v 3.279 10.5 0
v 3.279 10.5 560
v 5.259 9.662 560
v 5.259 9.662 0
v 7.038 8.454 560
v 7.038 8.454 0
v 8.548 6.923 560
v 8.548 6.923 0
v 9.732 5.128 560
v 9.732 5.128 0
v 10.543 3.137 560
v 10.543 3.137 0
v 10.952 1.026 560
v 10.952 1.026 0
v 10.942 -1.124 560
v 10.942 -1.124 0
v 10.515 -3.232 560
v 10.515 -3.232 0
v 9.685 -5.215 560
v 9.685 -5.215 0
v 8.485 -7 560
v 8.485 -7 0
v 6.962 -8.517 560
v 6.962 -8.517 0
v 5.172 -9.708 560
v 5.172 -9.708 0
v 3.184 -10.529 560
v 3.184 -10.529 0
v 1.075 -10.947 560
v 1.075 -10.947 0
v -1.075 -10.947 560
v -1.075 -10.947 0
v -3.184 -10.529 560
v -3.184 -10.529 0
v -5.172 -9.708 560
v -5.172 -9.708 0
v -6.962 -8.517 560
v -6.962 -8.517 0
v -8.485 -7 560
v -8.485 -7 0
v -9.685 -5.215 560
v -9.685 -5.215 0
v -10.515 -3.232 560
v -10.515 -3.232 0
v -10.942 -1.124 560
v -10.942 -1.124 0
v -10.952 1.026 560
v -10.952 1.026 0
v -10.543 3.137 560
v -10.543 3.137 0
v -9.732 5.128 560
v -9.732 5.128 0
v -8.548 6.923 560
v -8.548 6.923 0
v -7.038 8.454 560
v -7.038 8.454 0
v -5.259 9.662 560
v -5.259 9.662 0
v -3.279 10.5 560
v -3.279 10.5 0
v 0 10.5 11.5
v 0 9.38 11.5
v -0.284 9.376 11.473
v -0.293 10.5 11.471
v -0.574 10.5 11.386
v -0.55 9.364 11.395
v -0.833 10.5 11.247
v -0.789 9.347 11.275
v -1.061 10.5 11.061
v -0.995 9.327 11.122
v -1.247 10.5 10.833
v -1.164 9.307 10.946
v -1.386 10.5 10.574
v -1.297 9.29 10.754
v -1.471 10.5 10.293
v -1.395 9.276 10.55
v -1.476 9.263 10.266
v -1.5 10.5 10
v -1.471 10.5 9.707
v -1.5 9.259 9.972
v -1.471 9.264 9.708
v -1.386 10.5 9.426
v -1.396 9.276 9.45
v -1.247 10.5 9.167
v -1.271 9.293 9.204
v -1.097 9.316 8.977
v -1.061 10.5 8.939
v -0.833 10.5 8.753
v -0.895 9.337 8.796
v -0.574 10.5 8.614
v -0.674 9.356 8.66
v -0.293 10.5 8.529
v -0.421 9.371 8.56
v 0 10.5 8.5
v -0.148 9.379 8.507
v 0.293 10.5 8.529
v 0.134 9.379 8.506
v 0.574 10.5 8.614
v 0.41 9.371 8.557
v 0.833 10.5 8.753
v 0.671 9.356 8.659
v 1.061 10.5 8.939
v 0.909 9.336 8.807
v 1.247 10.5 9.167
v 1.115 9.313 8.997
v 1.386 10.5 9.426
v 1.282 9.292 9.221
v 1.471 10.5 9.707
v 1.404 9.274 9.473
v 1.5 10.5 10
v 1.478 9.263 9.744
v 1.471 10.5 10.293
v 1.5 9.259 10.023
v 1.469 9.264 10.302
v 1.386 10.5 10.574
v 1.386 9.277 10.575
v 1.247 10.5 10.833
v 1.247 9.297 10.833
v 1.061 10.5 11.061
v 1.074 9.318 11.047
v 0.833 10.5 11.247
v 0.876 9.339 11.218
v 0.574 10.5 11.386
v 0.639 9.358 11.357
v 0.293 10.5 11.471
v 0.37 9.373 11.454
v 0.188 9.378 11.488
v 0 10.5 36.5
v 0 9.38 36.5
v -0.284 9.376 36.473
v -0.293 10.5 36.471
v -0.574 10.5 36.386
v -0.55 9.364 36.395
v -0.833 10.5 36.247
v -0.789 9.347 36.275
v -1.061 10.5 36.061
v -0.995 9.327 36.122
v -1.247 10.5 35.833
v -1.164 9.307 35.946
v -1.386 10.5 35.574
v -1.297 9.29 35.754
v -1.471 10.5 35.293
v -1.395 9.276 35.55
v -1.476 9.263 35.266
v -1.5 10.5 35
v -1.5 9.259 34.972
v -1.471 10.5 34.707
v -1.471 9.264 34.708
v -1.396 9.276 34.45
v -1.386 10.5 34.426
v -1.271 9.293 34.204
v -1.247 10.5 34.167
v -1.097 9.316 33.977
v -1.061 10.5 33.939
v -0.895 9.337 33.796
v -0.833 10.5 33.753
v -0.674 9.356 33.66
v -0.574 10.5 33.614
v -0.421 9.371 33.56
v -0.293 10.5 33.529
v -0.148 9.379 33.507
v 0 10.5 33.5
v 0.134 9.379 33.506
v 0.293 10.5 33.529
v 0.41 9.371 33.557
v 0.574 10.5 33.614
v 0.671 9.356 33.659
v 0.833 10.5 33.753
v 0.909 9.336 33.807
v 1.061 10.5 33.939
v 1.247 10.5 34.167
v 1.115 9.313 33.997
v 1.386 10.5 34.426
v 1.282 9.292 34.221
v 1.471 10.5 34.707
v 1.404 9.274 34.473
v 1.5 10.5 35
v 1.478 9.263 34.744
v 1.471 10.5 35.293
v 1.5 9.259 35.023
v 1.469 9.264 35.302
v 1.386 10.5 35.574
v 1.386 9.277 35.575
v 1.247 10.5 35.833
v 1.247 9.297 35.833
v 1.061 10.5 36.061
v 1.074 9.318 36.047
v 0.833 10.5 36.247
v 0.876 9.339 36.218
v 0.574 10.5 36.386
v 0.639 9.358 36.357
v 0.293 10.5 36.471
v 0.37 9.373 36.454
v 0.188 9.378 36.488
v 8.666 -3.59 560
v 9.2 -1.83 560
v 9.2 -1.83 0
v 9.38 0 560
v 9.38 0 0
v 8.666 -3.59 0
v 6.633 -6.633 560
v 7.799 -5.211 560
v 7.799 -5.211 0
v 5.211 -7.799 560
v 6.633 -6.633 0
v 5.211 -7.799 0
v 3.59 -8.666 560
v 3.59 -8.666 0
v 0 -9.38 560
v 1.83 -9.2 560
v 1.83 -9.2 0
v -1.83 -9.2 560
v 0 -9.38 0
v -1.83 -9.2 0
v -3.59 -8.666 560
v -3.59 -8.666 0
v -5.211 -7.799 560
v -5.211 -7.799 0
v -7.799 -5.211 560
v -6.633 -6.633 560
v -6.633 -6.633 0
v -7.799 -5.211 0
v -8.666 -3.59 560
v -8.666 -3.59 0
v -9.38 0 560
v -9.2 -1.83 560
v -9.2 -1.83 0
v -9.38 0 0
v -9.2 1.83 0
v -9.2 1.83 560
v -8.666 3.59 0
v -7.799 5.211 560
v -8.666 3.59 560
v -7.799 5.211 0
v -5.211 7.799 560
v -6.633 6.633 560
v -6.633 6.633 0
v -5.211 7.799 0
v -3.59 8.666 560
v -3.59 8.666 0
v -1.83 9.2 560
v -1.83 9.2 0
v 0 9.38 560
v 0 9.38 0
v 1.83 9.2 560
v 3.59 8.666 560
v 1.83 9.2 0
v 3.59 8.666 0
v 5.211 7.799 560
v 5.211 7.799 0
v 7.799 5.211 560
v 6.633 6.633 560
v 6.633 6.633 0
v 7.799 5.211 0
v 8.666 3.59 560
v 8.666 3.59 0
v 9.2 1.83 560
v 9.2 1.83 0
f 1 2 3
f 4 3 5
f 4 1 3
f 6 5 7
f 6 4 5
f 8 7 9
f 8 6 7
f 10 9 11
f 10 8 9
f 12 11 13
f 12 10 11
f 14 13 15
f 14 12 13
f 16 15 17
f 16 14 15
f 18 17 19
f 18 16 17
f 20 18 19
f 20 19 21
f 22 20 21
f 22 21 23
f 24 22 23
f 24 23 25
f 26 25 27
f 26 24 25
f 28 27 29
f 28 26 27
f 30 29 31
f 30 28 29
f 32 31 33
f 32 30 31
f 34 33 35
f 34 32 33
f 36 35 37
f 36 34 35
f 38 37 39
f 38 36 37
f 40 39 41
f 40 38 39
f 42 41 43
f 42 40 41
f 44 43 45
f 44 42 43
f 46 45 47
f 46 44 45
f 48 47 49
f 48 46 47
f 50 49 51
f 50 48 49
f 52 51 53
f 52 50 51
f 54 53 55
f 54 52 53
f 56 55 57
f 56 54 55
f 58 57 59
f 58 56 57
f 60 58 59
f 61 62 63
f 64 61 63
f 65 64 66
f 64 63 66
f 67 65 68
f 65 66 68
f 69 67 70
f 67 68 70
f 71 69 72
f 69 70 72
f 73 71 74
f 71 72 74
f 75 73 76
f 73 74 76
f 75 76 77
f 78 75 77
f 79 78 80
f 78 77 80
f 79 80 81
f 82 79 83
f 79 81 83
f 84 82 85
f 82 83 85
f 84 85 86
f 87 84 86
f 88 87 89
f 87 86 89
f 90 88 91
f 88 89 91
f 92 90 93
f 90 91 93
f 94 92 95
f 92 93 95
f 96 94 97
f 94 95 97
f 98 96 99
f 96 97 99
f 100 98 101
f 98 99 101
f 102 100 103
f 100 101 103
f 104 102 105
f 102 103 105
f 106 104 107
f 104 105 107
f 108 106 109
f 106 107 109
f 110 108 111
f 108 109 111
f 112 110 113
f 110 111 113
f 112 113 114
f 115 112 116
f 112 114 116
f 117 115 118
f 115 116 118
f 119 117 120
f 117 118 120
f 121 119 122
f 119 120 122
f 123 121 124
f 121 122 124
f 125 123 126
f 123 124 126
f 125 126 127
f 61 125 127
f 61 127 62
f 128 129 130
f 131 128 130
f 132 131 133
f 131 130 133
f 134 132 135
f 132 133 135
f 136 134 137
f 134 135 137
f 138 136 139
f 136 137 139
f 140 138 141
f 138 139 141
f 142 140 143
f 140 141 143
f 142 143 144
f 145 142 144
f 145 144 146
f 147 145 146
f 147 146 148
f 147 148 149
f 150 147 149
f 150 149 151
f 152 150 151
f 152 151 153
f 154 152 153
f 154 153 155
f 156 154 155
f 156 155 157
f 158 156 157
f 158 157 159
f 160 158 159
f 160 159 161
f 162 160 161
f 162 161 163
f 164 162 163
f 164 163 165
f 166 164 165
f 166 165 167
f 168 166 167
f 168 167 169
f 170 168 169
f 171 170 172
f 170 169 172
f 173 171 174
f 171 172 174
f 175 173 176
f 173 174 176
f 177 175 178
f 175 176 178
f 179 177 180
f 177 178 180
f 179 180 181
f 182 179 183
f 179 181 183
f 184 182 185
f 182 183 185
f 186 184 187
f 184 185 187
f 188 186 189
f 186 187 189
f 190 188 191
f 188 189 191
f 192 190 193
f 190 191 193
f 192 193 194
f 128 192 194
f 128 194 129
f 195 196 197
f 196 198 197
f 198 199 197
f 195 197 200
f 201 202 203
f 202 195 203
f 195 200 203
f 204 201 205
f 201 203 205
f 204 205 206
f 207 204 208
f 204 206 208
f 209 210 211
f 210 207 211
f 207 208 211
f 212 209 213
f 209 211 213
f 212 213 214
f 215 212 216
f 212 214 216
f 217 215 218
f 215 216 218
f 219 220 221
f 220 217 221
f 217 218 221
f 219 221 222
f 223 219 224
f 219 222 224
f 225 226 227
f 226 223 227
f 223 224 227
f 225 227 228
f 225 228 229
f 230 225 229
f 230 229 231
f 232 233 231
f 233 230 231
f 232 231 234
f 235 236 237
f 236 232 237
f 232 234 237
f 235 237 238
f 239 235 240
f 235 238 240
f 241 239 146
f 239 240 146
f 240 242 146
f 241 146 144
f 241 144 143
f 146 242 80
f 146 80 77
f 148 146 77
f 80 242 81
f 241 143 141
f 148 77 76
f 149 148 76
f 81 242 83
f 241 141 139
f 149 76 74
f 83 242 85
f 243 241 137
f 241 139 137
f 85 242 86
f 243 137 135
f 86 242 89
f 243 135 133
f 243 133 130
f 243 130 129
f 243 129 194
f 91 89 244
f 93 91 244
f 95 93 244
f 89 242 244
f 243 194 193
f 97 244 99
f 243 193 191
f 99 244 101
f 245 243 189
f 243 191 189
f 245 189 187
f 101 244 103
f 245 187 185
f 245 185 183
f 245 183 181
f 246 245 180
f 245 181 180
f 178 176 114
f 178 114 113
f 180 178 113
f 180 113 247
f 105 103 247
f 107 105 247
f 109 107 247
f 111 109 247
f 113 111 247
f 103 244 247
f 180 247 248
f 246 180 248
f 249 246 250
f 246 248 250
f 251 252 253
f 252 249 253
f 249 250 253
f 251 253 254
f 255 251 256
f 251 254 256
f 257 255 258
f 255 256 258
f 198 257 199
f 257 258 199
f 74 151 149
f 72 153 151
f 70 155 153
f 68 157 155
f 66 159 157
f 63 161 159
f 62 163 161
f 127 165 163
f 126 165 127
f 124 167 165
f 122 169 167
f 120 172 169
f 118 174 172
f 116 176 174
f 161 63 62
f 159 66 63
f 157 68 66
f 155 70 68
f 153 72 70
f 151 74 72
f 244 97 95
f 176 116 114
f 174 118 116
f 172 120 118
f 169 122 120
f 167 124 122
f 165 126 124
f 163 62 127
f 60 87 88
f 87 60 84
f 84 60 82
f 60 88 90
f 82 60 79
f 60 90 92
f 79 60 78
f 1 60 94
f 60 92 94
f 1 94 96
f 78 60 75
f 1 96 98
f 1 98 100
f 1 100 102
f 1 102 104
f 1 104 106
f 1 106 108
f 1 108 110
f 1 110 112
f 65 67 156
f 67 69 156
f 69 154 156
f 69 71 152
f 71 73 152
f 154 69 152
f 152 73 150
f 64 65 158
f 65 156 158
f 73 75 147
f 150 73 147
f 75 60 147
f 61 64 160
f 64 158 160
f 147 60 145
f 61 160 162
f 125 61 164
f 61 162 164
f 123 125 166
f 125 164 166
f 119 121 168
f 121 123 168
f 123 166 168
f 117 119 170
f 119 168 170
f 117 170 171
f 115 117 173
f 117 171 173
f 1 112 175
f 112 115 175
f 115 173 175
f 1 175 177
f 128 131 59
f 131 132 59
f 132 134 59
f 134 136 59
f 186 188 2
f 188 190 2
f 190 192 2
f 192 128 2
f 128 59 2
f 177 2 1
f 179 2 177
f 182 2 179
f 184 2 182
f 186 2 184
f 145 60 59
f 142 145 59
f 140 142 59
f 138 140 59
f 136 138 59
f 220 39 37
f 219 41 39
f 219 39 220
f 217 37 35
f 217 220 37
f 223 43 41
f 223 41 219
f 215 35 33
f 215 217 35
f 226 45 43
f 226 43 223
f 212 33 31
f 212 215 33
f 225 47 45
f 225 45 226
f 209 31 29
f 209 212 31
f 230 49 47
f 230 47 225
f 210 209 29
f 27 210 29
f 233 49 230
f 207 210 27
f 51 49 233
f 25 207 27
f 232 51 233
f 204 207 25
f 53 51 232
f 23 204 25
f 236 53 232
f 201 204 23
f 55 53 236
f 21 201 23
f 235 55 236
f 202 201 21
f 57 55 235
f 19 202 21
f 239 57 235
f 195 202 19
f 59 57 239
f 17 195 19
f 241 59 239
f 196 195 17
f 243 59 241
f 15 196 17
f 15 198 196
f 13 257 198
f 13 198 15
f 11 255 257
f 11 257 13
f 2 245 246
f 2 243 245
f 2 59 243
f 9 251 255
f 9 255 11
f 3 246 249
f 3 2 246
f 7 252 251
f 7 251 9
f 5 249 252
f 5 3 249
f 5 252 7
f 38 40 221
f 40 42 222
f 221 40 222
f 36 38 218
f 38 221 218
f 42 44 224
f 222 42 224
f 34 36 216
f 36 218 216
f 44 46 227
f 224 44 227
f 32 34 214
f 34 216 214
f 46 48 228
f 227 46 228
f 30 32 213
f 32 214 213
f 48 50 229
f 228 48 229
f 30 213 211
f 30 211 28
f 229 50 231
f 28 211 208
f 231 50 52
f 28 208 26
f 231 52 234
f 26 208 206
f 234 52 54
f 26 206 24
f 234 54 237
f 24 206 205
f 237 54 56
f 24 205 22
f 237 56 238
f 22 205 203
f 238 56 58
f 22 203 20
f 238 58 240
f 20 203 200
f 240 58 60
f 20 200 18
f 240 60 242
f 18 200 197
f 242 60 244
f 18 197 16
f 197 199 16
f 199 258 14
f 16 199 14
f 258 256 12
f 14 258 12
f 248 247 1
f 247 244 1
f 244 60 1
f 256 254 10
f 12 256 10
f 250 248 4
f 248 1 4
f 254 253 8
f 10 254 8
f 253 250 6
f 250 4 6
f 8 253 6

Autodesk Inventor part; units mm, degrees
ref_plane "YZ Plane" through (0, 0, 0) normal (1, 0, 0) x (0, 1, 0)
ref_plane "XZ Plane" through (0, 0, 0) normal (0, 1, 0) x (-1, 0, 0)
ref_plane "XY Plane" through (0, 0, 0) normal (0, 0, 1) x (1, 0, 0)
sketch "Sketch1" plane through (0, 0, 0) normal (0, 0, 1) x (1, 0, 0)
  circle A0 centre (0, 0) radius 11
  circle A1 centre (0, 0) radius 9.38
  dimension "d0" = 22
  dimension "d2" = 1.62
extrude "Extrusion1" add sketch "Sketch1" along normal blind 560
sketch "Sketch6" plane through (0, 0, 560) normal (0, 0, 1) x (1, 0, 0)
  circle A0 centre (0, 0) radius 9.38 projected
  circle A1 centre (0, 0) radius 11 projected
  line L0 (-3.2787, 10.5) -> (3.2787, 10.5)
  dimension "d18" = 10.5
extrude "Extrusion3" cut sketch "Sketch6" against normal through all contours L0 A1 picked at (-0.3693, 10.648)
sketch "Sketch8" plane through (-3.2787, 10.5, 560) normal (0, 1, 0) x (1, 0, 0)
  circle A0 centre (3.2787, 550) radius 1.7934
  point P0 (3.2787, 560)
  dimension "d47" = 10
hole "Hole4" at (0, 10.5, 10) direction (0, -1, 0) diameter 3 depth 8 tip angle 118
sketch "Sketch9" plane through (-3.2787, 10.5, 560) normal (0, 1, 0) x (1, 0, 0)
  circle A0 centre (3.2787, 550) radius 1.5 projected
  circle A1 centre (3.2787, 525) radius 1.2403
  point P0 (3.2787, 560)
  dimension "d55" = 25
hole "Hole5" at (0, 10.5, 35) direction (0, -1, 0) diameter 3 depth 8 tip angle 118
properties part number "2f2barm" material "PVC-Piping"
